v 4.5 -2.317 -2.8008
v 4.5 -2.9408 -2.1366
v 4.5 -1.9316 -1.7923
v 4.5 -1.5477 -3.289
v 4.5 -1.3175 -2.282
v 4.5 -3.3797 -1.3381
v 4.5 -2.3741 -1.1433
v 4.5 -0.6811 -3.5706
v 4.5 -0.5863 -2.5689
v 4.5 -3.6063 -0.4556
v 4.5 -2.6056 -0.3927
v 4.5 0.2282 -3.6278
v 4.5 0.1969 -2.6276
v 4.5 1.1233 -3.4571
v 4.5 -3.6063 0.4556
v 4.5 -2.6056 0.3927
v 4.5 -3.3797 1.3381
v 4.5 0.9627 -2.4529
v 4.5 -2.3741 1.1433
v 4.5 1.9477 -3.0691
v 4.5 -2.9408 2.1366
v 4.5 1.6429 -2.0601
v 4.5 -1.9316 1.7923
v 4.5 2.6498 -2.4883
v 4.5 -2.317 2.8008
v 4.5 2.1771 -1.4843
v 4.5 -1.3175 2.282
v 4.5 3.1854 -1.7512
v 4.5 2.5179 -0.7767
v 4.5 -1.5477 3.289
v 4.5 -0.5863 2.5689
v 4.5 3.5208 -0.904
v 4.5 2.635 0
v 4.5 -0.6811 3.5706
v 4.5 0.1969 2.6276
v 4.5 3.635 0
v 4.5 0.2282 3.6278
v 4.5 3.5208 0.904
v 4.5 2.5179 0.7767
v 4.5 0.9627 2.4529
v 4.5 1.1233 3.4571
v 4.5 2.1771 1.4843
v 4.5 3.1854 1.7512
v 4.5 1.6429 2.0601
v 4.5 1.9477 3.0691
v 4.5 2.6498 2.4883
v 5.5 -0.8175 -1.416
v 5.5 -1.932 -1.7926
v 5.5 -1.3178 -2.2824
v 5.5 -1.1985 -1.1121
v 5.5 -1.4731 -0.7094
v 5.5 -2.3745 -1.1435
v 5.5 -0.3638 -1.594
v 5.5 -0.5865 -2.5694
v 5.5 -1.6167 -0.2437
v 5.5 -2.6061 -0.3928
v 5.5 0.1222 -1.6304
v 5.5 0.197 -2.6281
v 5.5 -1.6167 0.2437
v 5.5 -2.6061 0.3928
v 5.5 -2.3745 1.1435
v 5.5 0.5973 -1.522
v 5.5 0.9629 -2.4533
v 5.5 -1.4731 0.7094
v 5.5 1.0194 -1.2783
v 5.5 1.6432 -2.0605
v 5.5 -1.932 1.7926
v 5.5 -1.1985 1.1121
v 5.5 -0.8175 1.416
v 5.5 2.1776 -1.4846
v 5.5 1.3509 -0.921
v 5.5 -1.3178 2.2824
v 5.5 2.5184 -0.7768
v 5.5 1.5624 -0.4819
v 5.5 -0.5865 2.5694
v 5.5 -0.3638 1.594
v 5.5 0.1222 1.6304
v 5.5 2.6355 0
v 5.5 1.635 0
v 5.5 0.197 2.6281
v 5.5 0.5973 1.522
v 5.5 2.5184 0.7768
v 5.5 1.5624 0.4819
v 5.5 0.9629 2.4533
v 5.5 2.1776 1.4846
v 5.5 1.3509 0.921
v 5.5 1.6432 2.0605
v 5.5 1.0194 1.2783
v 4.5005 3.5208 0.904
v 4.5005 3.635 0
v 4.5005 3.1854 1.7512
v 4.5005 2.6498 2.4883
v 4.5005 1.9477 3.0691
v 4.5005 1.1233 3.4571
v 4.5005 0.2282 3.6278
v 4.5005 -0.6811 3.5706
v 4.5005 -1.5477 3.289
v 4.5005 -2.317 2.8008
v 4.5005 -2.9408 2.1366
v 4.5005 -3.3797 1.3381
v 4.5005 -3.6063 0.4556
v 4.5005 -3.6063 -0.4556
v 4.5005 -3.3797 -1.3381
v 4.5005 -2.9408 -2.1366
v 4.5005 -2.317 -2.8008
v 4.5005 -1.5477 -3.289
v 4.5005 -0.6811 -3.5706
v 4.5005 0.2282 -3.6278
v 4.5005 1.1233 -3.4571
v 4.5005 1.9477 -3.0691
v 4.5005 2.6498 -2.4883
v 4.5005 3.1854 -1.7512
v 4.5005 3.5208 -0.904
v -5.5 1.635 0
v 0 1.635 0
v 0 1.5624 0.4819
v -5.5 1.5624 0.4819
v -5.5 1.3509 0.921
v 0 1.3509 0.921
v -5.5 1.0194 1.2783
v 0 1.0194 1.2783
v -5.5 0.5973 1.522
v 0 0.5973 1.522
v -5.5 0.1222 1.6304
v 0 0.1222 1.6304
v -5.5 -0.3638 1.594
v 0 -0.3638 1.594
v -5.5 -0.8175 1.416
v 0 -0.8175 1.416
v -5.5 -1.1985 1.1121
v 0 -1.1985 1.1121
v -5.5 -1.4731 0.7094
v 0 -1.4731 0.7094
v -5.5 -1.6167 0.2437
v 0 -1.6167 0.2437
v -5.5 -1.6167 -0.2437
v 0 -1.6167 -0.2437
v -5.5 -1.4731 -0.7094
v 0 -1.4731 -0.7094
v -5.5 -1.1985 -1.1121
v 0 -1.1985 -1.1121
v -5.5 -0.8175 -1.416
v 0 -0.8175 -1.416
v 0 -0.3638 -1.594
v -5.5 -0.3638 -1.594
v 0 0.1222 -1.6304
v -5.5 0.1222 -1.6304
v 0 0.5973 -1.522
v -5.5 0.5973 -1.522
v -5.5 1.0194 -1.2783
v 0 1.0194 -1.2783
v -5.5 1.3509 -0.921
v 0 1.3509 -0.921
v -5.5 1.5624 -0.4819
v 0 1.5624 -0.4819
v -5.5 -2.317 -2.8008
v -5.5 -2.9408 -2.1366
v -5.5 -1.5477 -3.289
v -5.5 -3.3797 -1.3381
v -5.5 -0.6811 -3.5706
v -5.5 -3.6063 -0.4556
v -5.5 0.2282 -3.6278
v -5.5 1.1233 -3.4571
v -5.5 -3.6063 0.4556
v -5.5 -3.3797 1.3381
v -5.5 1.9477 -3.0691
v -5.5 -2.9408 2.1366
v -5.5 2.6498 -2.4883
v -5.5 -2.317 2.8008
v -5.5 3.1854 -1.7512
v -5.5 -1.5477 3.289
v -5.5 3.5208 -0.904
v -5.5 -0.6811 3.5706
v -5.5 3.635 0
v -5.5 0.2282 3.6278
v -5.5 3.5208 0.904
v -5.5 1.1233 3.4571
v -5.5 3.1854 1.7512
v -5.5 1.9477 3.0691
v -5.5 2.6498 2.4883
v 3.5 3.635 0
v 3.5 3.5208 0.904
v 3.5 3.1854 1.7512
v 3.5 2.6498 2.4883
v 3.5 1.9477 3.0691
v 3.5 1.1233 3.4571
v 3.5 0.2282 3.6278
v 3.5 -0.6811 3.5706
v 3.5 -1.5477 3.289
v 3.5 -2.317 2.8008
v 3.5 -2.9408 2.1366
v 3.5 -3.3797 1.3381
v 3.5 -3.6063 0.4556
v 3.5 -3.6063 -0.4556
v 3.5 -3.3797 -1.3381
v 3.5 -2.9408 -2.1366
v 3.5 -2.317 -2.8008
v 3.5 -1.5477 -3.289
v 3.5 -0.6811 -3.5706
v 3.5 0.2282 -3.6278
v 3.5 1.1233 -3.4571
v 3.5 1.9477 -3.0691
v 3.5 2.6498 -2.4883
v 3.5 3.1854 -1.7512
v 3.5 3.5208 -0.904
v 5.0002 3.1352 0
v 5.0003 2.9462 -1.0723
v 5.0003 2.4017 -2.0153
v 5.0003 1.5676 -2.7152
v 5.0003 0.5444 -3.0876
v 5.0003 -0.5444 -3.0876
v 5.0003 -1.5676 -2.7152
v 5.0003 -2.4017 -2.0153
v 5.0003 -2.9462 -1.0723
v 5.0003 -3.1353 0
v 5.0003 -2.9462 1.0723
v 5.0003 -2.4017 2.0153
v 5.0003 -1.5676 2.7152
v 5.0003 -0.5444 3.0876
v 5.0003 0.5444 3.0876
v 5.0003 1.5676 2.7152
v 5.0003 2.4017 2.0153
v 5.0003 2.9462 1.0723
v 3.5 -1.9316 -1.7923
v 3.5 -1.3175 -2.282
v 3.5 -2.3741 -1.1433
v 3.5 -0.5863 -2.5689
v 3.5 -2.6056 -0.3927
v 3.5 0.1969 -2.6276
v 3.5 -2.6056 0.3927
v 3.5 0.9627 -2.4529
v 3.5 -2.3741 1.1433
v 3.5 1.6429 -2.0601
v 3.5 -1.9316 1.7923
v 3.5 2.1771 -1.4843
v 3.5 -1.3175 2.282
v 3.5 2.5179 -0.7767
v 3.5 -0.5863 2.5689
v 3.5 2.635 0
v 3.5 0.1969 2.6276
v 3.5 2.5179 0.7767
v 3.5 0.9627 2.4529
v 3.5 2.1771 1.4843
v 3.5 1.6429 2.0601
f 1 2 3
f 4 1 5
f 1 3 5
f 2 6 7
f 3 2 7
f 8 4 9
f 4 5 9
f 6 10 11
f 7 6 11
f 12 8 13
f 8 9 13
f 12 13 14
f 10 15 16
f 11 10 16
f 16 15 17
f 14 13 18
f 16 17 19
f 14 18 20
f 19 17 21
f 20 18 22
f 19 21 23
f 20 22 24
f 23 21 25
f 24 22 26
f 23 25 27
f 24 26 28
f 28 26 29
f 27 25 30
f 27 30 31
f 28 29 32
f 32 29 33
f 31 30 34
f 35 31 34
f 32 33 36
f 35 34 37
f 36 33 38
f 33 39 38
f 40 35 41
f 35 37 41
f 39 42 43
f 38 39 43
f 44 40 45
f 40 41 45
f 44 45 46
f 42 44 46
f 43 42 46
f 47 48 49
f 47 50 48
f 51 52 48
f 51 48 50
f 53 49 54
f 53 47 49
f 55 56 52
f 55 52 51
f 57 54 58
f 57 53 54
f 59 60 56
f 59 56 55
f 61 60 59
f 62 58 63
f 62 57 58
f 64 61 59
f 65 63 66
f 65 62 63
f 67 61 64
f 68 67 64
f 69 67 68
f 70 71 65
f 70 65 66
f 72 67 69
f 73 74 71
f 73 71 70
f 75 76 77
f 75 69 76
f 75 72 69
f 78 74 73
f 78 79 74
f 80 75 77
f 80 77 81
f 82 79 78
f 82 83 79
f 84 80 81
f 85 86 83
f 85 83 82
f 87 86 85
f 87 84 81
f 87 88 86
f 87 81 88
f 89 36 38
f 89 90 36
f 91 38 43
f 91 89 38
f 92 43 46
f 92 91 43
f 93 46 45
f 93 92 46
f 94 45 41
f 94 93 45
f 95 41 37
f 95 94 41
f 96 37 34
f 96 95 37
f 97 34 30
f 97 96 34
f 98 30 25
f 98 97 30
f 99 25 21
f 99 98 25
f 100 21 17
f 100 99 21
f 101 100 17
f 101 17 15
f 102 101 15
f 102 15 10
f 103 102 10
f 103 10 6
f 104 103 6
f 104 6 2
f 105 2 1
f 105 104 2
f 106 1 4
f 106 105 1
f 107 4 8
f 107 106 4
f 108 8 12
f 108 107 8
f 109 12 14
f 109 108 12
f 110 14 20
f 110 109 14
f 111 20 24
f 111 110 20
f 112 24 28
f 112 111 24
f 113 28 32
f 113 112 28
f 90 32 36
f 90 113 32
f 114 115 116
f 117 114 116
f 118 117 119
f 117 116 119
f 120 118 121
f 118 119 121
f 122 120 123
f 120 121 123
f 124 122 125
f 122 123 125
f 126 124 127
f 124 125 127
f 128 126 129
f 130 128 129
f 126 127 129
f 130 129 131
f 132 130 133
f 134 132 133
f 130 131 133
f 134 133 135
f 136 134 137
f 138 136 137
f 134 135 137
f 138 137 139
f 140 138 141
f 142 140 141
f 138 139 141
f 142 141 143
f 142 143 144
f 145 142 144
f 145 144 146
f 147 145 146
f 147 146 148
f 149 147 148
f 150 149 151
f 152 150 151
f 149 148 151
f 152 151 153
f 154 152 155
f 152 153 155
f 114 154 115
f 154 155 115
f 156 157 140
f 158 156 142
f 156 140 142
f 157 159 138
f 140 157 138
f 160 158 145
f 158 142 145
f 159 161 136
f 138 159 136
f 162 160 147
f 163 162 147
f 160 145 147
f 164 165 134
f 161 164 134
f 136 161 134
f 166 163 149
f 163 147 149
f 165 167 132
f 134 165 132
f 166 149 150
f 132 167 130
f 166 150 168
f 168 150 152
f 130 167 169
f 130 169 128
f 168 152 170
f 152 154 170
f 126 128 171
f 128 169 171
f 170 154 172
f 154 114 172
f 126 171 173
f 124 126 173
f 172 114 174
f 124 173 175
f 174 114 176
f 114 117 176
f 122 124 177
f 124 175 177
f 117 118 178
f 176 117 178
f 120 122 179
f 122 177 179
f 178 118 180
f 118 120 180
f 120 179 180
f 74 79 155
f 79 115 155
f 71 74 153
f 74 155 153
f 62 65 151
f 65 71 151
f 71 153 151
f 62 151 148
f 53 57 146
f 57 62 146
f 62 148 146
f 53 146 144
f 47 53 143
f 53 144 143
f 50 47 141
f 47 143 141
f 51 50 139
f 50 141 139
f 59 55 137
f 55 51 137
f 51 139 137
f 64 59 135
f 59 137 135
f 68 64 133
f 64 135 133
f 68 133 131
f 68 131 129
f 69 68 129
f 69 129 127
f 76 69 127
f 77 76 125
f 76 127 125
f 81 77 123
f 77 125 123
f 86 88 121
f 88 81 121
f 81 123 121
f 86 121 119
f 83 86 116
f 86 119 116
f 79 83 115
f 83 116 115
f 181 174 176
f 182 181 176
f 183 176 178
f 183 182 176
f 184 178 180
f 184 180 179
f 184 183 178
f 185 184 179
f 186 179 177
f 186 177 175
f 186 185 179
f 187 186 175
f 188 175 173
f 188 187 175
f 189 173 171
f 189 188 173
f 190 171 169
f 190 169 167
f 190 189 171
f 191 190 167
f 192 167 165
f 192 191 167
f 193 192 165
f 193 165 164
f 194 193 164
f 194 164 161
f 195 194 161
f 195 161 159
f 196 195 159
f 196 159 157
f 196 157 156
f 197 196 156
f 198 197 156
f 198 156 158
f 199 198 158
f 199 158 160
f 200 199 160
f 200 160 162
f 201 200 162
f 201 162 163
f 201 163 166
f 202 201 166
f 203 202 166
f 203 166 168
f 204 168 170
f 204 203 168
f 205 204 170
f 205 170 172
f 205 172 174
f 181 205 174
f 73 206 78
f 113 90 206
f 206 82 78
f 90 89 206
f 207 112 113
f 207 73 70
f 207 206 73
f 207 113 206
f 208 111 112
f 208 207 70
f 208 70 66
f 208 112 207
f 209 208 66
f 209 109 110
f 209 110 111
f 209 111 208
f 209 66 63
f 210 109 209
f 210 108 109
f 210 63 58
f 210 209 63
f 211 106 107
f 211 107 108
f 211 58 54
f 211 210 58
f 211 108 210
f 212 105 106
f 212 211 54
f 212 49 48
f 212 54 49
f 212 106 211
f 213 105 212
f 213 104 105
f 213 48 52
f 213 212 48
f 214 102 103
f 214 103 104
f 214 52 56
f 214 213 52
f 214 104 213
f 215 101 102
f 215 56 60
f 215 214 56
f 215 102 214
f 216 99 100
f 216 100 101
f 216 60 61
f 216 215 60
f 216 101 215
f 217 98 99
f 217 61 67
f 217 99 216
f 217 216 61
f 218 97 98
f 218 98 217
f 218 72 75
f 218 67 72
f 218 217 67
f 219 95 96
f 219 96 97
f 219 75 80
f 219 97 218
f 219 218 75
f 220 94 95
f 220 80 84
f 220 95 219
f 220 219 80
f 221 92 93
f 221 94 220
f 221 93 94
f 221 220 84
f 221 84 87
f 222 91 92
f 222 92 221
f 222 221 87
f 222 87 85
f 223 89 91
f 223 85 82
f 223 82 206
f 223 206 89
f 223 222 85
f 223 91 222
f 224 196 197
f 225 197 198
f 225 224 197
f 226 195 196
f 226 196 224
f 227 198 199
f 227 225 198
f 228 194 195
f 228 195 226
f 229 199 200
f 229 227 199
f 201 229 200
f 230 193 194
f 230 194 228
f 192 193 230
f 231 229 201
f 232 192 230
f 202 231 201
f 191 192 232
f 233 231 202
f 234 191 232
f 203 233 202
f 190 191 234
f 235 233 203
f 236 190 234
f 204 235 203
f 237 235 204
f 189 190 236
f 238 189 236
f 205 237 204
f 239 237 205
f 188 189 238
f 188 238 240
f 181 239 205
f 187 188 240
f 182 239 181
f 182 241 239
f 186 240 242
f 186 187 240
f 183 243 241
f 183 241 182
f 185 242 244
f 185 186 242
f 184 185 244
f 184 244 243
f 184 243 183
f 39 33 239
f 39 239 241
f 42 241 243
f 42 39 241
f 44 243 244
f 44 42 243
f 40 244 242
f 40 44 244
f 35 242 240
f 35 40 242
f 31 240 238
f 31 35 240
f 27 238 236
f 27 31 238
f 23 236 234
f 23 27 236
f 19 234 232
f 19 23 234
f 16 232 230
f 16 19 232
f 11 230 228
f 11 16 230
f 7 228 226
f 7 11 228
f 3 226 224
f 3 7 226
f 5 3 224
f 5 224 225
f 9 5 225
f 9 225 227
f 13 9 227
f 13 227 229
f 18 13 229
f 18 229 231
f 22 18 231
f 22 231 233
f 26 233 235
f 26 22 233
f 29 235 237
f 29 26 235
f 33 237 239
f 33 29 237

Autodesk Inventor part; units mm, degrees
ref_plane "YZ Plane" through (0, 0, 0) normal (1, 0, 0) x (0, 1, 0)
ref_plane "XZ Plane" through (0, 0, 0) normal (0, 1, 0) x (-1, 0, 0)
sketch "スケッチ1" plane through (0, 0, 0) normal (1, 0, 0) x (0, 1, 0)
  circle A0 centre (0, 0) radius 3.635
  circle A1 centre (0, 0) radius 1.635
  circle A2 centre (0, 0) radius 2.635
  dimension "d0" = 3.27
  dimension "d1" = 2
  dimension "d7" = 1
extrude "押し出し1" add sketch "スケッチ1" along normal mid plane 11 contours A0 | A2
ref_plane "作業平面1" through (4.5, 0, 0) normal (1, 0, 0) x (0, 0, -1)
extrude "押し出し3" cut sketch "スケッチ1" against normal blind 1 from surface at 4.5 contours A0
chamfer "面取り3" distance 1 angle 45 1 edges at (5.5, -3.635, 0)
properties part number "spacer_Φ3.2_1"
